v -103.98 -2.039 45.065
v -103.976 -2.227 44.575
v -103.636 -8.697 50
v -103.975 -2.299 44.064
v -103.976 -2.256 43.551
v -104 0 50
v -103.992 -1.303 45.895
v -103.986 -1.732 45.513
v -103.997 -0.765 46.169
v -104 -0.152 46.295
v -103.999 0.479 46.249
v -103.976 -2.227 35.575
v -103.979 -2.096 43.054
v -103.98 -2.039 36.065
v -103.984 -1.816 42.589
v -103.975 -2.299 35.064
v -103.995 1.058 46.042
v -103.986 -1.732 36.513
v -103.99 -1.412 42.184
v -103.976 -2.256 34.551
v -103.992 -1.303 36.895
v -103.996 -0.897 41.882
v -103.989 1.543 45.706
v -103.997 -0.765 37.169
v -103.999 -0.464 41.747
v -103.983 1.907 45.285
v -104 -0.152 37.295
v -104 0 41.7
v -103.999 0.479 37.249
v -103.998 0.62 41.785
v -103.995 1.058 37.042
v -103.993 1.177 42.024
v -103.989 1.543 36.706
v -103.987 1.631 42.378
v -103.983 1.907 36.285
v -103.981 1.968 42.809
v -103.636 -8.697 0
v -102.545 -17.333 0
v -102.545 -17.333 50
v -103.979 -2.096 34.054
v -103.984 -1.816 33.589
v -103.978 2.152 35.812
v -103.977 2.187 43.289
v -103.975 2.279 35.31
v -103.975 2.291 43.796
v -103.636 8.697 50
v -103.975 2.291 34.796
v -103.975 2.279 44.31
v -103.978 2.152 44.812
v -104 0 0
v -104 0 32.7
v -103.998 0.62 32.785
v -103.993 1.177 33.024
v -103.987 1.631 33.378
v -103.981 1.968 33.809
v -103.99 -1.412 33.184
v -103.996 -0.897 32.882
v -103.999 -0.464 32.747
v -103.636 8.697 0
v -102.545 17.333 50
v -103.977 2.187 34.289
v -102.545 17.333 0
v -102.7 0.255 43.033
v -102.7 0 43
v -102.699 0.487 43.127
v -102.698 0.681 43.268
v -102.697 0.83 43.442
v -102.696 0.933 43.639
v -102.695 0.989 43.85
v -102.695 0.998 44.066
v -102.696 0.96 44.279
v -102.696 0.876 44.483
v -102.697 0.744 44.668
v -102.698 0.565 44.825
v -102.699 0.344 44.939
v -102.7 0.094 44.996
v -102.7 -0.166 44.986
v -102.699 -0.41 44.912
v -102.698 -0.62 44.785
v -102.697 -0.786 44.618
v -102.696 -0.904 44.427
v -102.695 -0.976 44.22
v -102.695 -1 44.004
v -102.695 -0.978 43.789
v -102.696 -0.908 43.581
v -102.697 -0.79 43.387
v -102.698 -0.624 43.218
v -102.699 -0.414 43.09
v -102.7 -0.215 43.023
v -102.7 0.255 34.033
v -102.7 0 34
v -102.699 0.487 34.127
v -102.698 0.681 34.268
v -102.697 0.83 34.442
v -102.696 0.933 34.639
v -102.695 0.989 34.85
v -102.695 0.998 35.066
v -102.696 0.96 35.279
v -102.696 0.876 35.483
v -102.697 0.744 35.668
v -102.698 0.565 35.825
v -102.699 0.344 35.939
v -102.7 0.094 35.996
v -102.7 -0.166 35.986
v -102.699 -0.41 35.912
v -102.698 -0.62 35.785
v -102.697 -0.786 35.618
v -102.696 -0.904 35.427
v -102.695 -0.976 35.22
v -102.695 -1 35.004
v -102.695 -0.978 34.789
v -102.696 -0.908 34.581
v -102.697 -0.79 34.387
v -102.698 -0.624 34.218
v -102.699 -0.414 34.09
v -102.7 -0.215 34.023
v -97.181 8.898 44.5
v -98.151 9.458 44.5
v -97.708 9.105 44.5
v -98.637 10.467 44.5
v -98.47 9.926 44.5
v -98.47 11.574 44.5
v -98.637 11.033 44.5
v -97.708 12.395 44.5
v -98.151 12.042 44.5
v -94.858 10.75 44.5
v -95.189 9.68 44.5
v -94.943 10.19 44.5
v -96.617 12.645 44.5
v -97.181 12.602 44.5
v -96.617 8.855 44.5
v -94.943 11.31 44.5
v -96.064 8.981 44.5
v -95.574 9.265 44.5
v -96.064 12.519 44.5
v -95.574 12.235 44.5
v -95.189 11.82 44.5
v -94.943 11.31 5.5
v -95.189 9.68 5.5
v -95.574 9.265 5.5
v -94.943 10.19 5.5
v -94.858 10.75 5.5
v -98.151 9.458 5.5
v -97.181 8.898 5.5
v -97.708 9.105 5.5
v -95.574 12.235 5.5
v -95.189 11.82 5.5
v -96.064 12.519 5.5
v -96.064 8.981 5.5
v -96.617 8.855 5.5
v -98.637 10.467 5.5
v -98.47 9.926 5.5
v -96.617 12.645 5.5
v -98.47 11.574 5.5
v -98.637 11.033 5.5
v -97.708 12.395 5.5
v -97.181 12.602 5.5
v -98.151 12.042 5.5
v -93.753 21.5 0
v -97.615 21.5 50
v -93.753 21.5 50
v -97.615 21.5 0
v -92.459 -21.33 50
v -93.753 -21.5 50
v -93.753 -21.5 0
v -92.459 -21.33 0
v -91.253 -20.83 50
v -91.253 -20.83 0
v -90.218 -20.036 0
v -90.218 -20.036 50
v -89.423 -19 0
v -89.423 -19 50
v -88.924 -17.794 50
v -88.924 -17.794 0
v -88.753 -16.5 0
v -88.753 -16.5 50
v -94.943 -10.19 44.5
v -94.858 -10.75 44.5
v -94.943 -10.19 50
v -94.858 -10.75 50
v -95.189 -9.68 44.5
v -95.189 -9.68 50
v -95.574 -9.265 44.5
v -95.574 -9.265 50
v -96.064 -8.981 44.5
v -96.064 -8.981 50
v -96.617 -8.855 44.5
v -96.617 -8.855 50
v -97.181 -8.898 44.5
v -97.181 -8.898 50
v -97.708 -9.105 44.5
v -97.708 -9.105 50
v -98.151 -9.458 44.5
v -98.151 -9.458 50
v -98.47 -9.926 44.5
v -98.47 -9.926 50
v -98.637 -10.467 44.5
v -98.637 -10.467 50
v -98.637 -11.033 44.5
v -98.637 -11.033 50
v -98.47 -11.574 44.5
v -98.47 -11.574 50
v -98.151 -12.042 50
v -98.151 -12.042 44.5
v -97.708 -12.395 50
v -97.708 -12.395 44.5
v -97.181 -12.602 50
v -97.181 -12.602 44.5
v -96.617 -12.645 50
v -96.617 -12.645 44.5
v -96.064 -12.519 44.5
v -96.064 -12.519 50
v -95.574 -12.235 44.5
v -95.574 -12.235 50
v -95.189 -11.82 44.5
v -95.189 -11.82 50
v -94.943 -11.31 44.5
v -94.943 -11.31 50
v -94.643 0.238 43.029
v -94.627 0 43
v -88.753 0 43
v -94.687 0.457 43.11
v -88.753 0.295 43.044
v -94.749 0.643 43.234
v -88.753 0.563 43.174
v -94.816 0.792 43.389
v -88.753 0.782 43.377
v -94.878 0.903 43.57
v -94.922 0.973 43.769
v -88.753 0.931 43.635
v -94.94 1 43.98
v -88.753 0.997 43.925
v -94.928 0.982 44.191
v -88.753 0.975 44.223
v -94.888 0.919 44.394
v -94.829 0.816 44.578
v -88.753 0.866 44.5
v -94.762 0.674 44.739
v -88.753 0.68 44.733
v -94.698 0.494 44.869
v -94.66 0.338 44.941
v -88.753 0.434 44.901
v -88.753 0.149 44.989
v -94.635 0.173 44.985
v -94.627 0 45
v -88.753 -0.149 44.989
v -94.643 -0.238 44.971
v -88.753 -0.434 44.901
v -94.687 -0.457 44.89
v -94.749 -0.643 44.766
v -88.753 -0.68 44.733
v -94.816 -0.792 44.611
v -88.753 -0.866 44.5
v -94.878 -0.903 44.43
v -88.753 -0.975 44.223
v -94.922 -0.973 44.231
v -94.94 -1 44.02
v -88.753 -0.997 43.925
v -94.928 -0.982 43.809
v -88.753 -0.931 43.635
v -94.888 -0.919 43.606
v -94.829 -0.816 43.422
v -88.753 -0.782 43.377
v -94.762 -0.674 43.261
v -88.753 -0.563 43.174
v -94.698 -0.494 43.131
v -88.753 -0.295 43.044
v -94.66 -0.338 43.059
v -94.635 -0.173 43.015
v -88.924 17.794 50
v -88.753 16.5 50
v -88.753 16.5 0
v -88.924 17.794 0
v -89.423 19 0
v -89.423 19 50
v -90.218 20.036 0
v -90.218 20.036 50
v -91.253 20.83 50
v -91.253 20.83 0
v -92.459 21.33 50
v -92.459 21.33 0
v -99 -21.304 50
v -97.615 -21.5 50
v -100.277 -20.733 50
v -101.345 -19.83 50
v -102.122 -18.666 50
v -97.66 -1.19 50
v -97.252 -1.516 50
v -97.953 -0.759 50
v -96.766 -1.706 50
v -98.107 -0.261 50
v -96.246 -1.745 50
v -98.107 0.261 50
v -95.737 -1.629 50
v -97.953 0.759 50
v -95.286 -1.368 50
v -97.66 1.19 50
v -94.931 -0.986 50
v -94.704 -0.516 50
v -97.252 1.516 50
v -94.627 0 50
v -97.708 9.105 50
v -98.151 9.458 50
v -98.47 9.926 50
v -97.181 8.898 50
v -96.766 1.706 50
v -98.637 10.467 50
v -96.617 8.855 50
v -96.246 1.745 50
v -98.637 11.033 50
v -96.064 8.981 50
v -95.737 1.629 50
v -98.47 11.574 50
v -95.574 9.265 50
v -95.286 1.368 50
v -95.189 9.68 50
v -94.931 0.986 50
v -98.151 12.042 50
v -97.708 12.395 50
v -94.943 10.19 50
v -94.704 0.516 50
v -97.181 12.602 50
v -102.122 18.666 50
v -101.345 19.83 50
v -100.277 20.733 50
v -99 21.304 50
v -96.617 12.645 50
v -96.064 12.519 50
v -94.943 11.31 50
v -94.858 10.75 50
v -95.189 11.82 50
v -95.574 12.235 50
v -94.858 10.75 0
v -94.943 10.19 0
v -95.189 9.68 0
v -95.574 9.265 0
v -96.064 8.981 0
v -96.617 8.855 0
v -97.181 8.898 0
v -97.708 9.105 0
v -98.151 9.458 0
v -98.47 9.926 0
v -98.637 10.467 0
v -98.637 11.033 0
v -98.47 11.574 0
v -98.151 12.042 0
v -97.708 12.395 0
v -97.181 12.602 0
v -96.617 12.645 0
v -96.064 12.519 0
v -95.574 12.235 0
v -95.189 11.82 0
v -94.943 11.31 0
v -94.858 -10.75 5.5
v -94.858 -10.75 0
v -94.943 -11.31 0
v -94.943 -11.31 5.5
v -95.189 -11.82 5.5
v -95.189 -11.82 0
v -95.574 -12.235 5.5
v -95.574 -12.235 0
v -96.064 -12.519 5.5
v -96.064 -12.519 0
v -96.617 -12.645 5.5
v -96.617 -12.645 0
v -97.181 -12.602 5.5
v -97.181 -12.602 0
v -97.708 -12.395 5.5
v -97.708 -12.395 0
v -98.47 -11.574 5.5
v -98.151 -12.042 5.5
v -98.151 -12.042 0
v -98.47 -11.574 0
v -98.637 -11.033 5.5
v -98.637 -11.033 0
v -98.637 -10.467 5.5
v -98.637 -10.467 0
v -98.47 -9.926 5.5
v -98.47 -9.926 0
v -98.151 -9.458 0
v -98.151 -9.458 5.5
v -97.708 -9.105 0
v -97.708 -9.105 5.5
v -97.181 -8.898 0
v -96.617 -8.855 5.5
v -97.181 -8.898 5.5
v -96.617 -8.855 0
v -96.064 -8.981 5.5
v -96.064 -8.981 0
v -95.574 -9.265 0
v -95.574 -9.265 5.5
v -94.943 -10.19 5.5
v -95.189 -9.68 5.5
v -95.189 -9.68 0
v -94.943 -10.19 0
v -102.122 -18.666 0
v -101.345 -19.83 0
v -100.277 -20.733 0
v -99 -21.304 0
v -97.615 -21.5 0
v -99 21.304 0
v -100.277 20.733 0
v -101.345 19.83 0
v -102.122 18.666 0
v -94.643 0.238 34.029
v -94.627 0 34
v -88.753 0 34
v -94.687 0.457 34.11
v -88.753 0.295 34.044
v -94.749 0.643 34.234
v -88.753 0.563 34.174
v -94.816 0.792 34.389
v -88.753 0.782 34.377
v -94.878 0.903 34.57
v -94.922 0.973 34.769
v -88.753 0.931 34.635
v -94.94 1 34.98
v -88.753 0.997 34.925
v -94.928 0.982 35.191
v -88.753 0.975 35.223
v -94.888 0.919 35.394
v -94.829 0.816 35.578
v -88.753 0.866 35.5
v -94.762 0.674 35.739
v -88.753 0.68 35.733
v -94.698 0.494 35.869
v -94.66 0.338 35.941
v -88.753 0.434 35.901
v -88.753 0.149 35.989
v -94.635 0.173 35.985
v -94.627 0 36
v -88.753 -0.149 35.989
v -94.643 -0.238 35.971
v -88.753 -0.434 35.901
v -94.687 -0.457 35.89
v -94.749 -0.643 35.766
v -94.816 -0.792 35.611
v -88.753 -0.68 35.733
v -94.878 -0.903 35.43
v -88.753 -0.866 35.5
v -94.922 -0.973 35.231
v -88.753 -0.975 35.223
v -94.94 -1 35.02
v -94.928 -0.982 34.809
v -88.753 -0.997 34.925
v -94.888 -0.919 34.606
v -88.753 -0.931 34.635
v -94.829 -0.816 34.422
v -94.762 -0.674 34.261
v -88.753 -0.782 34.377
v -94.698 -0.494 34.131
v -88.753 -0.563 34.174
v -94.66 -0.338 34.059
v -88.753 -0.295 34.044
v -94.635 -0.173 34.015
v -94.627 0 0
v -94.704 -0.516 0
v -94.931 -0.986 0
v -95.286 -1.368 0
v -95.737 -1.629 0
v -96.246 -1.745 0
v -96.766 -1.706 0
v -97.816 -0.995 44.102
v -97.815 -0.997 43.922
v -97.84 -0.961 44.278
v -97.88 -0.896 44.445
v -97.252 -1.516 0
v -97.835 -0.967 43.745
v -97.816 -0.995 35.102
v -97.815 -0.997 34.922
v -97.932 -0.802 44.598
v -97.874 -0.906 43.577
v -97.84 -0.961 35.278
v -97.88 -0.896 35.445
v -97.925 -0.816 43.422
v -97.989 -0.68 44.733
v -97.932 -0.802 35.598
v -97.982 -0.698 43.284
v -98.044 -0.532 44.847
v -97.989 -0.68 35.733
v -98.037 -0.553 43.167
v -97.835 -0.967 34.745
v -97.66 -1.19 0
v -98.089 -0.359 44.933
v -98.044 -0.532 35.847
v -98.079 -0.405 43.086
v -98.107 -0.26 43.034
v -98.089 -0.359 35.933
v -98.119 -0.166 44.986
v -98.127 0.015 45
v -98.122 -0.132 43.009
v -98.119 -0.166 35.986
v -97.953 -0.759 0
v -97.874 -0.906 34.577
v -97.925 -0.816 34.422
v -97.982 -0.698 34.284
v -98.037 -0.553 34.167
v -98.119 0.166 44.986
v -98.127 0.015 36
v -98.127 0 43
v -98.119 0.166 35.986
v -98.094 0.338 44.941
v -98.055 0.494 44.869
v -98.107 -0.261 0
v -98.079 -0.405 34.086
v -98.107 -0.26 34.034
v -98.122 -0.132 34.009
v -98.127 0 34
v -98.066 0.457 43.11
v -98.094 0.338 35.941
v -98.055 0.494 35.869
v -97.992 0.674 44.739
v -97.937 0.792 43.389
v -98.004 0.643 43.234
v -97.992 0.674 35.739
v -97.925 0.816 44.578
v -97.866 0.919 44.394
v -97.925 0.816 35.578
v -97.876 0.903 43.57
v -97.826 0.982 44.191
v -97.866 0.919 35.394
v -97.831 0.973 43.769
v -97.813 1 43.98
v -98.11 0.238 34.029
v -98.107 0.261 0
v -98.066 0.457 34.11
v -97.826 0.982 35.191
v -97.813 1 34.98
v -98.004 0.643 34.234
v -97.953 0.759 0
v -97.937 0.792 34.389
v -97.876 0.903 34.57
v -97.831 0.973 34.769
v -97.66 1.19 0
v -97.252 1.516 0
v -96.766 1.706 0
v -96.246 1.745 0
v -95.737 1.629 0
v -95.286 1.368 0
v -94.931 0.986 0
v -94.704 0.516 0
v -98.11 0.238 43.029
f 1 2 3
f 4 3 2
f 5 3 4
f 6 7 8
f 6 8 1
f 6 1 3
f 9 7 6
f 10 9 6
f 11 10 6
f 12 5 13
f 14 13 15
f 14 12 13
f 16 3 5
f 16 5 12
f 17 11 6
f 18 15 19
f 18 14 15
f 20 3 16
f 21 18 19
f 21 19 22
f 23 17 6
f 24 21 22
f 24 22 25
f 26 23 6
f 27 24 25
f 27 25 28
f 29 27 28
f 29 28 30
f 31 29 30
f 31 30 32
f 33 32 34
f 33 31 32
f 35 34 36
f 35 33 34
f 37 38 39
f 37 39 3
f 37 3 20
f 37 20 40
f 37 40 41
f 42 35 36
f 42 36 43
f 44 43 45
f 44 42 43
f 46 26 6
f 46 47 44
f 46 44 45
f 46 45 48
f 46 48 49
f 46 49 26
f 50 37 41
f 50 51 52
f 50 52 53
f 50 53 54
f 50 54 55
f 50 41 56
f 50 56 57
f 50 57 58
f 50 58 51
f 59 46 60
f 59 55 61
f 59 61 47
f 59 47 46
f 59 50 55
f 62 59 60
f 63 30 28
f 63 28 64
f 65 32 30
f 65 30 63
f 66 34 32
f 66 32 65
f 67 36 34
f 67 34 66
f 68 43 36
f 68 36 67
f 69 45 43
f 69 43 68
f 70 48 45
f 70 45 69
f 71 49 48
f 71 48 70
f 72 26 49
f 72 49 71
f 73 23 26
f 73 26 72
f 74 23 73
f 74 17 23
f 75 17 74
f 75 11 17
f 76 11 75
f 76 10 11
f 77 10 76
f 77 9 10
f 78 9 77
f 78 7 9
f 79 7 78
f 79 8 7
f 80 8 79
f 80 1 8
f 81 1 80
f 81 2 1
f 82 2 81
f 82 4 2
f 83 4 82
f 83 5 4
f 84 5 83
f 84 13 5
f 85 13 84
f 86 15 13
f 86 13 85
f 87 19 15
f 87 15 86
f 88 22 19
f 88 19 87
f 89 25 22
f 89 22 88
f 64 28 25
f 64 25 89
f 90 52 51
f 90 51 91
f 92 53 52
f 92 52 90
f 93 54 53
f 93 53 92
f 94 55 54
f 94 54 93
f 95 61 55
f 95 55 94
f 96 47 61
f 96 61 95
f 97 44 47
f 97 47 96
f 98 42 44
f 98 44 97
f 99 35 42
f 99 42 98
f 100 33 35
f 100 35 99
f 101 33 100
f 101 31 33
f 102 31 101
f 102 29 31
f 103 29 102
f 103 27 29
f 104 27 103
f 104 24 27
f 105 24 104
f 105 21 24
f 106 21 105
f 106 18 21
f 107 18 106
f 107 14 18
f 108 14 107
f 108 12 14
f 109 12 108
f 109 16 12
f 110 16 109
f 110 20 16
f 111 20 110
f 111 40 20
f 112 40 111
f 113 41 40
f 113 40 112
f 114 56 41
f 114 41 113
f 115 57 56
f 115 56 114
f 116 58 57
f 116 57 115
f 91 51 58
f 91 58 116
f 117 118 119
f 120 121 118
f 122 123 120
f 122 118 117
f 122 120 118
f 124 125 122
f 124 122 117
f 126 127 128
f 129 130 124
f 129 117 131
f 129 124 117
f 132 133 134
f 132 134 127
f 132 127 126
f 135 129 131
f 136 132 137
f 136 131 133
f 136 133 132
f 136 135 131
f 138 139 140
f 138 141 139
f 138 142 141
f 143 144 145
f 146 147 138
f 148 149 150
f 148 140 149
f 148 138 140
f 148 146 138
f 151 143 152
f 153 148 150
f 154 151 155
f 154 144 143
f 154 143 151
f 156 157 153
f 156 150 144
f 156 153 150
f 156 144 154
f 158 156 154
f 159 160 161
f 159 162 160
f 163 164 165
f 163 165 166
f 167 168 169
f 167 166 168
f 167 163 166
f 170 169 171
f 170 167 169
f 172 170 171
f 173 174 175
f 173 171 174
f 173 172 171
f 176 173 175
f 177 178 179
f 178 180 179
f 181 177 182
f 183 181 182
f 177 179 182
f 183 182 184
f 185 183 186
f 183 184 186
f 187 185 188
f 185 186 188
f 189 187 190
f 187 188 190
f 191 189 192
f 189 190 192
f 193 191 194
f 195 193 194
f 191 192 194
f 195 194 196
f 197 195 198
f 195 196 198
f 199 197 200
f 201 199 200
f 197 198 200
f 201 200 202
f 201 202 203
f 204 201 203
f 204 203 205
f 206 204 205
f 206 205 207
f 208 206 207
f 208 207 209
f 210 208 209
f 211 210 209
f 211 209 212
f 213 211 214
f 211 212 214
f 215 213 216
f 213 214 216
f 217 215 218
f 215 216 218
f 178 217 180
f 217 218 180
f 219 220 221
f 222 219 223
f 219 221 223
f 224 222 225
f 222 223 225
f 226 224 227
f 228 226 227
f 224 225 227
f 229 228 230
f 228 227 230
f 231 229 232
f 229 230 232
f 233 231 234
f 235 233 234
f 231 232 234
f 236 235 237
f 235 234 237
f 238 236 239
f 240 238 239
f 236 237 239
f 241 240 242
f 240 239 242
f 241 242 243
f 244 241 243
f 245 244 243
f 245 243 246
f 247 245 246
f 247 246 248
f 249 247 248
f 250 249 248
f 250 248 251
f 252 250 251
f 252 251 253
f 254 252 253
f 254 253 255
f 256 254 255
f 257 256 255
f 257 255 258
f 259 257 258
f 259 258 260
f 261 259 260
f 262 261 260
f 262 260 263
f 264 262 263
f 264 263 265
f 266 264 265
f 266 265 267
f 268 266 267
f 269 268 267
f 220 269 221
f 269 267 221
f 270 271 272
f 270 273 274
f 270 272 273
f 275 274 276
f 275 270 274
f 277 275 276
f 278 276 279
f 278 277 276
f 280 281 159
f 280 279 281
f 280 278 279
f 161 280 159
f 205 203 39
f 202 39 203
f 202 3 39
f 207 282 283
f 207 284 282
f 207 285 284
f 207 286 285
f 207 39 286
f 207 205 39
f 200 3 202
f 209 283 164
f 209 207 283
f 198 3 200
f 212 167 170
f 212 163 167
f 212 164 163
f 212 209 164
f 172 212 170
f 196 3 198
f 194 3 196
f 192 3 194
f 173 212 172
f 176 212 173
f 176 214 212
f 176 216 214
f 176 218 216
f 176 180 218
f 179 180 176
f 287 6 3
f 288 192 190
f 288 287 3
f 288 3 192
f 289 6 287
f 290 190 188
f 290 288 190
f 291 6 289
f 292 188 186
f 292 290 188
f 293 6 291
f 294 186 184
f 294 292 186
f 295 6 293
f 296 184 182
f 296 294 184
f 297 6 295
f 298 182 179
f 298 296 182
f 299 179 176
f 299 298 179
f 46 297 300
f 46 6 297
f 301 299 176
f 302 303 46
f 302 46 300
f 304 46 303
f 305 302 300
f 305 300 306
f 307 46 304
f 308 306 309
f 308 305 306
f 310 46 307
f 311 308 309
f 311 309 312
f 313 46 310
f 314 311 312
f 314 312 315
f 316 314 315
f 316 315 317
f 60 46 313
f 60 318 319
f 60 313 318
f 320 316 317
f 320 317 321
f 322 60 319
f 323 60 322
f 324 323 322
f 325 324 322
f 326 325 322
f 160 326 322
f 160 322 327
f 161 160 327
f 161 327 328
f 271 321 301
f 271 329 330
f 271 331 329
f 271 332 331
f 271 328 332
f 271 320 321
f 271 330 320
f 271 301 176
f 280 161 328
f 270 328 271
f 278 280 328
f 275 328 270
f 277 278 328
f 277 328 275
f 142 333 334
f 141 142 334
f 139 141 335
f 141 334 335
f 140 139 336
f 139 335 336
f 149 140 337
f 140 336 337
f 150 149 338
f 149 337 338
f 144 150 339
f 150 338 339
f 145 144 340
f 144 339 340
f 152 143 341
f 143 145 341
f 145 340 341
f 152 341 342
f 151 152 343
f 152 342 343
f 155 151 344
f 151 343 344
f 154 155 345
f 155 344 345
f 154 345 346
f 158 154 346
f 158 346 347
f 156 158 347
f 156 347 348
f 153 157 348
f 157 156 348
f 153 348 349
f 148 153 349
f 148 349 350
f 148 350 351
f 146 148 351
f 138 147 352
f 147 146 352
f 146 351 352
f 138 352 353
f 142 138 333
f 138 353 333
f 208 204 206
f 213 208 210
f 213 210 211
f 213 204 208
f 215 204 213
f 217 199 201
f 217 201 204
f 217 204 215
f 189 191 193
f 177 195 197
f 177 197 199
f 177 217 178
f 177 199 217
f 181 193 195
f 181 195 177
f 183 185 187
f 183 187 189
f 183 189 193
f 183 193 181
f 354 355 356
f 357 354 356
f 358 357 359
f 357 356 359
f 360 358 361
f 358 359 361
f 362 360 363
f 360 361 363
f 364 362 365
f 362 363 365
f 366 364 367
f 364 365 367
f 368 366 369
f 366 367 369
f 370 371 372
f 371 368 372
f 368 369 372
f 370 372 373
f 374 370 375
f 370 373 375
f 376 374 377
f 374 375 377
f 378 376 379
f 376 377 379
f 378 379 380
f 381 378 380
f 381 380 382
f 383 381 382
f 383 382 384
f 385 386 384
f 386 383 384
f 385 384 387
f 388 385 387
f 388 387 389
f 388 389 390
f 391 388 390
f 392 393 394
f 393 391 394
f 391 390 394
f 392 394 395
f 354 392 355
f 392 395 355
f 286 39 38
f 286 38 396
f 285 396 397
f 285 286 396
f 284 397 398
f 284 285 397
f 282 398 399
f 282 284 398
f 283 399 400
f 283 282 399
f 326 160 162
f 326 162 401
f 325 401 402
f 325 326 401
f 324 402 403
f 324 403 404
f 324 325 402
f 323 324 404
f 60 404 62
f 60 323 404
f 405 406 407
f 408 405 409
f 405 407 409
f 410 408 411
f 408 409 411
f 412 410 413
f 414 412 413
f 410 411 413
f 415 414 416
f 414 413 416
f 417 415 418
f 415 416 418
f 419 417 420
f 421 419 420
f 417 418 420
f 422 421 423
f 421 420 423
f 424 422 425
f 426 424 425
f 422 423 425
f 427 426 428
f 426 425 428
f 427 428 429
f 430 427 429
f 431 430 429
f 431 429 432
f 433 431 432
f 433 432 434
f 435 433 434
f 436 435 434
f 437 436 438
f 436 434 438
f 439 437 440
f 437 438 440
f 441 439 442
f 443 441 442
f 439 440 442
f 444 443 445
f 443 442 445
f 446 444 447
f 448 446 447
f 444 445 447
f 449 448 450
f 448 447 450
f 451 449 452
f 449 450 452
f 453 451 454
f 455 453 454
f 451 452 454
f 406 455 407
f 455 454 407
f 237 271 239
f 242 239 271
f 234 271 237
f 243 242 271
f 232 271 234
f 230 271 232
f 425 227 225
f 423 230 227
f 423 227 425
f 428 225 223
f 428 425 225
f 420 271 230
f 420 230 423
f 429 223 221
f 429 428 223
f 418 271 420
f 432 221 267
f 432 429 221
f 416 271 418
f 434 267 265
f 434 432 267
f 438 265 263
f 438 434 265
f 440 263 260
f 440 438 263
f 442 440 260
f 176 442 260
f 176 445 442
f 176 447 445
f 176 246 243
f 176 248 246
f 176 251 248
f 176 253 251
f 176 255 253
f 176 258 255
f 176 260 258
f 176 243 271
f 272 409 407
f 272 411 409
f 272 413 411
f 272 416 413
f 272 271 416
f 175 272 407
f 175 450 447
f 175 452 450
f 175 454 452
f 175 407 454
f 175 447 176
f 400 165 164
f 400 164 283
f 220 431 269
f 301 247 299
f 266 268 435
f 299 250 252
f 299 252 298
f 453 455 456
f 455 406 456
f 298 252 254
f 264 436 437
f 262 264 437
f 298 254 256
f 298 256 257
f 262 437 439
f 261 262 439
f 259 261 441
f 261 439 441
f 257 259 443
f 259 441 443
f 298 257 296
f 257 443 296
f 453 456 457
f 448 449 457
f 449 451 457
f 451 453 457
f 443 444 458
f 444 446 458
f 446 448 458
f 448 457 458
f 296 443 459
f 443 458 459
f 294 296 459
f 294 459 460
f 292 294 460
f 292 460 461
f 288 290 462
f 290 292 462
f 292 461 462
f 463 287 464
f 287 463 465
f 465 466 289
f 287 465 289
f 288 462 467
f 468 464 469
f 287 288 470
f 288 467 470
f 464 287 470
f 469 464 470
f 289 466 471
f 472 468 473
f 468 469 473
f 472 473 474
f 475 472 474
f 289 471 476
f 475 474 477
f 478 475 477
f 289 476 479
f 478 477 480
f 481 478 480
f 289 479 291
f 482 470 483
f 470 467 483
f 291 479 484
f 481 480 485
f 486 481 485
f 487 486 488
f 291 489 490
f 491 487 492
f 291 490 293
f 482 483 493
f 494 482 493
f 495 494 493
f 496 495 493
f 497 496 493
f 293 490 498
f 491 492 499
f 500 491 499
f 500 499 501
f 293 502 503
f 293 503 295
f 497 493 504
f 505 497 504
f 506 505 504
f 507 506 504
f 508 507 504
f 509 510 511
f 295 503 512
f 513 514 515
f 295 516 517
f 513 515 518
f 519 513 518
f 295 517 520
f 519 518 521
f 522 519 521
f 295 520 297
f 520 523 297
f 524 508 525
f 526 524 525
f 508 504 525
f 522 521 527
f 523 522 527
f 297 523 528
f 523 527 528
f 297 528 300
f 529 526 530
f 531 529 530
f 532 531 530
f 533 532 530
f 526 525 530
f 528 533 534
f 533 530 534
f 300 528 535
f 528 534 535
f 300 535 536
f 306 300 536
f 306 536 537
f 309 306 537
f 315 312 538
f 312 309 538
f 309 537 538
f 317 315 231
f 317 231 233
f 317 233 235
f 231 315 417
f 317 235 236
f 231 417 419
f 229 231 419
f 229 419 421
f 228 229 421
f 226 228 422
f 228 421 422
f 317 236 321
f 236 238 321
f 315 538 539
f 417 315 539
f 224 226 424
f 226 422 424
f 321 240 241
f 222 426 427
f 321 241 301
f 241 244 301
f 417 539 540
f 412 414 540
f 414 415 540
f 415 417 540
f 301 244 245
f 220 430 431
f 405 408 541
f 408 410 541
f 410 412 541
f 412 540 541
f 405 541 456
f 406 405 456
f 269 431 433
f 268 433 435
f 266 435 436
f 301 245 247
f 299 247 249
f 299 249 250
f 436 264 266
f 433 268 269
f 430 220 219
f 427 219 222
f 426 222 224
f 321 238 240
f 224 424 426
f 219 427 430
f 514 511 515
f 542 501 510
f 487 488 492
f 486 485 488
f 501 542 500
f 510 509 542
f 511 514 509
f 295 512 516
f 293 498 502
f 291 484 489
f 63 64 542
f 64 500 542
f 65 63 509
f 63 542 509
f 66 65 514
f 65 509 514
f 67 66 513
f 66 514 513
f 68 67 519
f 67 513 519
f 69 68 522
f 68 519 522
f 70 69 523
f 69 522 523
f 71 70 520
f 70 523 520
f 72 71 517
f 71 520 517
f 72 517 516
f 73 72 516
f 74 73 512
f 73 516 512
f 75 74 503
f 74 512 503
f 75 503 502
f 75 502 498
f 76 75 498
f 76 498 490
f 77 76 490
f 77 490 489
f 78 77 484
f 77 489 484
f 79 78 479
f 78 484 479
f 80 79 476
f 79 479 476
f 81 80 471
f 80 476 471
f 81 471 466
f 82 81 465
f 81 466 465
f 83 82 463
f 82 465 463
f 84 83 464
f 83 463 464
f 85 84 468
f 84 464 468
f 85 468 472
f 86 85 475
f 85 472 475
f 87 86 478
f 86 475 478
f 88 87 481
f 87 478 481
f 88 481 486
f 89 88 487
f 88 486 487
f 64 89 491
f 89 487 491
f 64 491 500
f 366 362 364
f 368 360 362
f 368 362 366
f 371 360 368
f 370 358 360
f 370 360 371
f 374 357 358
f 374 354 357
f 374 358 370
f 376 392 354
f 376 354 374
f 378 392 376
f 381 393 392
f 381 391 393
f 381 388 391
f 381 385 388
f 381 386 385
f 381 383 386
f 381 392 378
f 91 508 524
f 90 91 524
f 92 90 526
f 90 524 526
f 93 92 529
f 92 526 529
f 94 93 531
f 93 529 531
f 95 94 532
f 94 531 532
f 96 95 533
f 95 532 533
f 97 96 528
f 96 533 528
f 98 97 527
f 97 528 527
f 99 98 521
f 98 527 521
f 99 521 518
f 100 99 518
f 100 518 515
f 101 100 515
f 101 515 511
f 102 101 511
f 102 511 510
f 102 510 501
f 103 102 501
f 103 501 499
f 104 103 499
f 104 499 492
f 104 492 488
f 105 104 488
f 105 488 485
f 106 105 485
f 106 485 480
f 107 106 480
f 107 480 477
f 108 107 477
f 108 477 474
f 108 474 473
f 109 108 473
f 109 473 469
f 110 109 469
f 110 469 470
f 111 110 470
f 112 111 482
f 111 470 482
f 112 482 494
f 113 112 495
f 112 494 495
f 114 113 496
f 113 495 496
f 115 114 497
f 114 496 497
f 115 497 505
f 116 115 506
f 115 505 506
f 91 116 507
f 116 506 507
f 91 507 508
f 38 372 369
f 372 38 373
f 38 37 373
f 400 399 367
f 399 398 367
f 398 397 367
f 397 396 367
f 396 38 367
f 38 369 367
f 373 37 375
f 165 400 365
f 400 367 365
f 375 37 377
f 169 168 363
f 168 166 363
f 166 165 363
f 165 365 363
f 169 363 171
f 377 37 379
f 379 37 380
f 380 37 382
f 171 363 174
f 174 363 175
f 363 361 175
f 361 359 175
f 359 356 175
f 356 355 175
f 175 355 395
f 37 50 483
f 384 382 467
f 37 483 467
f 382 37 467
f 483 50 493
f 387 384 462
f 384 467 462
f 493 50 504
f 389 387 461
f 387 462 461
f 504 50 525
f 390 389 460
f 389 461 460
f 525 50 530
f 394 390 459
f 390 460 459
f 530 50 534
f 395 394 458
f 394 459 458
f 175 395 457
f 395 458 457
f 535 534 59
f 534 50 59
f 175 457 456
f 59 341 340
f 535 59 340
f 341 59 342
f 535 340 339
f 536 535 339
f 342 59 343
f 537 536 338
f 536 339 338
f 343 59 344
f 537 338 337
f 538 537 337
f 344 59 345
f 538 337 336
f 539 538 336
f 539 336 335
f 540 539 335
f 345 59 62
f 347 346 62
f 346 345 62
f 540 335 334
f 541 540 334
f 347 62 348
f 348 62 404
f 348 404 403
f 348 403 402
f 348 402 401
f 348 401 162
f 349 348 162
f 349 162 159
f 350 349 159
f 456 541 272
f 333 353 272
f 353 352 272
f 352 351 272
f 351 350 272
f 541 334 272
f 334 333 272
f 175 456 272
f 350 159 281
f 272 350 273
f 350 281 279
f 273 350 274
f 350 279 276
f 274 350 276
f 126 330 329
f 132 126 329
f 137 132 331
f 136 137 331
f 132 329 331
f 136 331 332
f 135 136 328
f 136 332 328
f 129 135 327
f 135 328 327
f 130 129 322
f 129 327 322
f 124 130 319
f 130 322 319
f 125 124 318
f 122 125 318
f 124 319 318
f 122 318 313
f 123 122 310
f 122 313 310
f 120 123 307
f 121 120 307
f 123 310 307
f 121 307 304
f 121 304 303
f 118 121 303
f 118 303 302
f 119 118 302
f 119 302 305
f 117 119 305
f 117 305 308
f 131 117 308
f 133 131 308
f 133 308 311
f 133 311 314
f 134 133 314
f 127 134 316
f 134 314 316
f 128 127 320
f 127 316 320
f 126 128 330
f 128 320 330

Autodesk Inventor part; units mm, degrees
ref_plane "РабПлоскость1" through (0, 0, 0) normal (0, 0, 1) x (1, 0, 0)
sketch "Эскиз1" plane through (0, 0, 0) normal (0, 0, 1) x (1, 0, 0)
  arc A0 (37.3284, -97.07) -> (37.3284, 97.07) centre (0, 0) ccw projected
  line L0 (-145.6, 0) -> (145.6, 0) construction
  line L1 (-101.7534, 21.5) -> (-88.7534, 21.5)
  line L2 (-88.7534, 21.5) -> (-88.7534, -21.5)
  line L3 (-88.7534, -21.5) -> (-101.7534, -21.5)
  line L4 (-101.7534, -21.5) -> (-101.7534, 21.5) construction
  line L5 (104, 0) -> (-88.7534, 0) construction
  circle A1 centre (-96.3767, 0) radius 1.75
  arc A2 (-92.7471, 47.0529) -> (-92.7471, -47.0529) centre (0, 0) ccw
  point P0 (0, 0)
  point P1 (-101.7534, 0)
  point P2 (-101.7534, 21.5)
  dimension "d0" = 43
  dimension "d1" = 13
ref_plane "РабПлоскость2" through (-75.9237, -75.9237, 50) normal (0, 0, 1) x (0.7071, -0.7071, 0)
extrude "Выдавливание1" add sketch "Эскиз1" along normal up to surface (50 mm away)
fillet "Сопряжение1" radius 5 4 edges at (-88.7534, 21.5, 25) (-88.7534, -21.5, 25) (-101.7534, -21.5, 25) (-101.7534, 21.5, 25)
sketch "Эскиз2" plane through (-88.7534, -16.5, 0) normal (1, 0, 0) x (0, 0, -1)
  line L0 (-50, 18.25) -> (-50, 14.75) projected
  line L1 (0, 14.75) -> (0, 18.25) projected
  circle A0 centre (-44, 16.5) radius 1
  line L2 (-50, 14.75) -> (0, 14.75) projected
  circle A1 centre (-35, 16.5) radius 1
  line L3 (-50, 16.5) -> (0, 16.5) construction
  line L4 (-50, 33) -> (-50, 0) projected
  point P0 (0, 16.5)
  dimension "d6" = 2
  dimension "d9" = 6
  dimension "d10" = 15
extrude "Выдавливание2" cut sketch "Эскиз2" against normal through all
chamfer "Фаска1" distance 1.3 angle 45 2 edges at (-104, 0.0084, 45) (-104, 0.0084, 36)
sketch "Эскиз3" plane through (-97.6153, -21.5, 50) normal (0, 0, 1) x (1, 0, 0)
  line L0 (0.8568, 43) -> (0.8568, 0) construction
  circle A0 centre (0.8568, 21.5) radius 1.8 projected
  line L1 (0, 43) -> (3.8619, 43) construction
  line L2 (3.8619, 0) -> (0, 0) construction
  circle A1 centre (0.8568, 32.25) radius 1.9
  circle A2 centre (0.8568, 10.75) radius 1.9
  point P0 (97.6153, 21.5)
  point P1 (0.8568, 21.5)
  point P2 (-4.1381, 43)
  dimension "d16" = 21.5
  dimension "d17" = 10.75
  dimension "d18" = 10.75
  dimension "d19" = 3.8
extrude "Выдавливание3" cut sketch "Эскиз3" against normal blind 5.5 contours A1 | A2
ref_plane "РабПлоскость3" through (-97.6153, -21.5, 25) normal (0, 0, 1) x (1, 0, 0)
mirror "Зеркальное отражение1" about plane through (-97.6153, -21.5, 25) normal (0, 0, 1) of "Выдавливание3"
equation "\"d17\" = 0.5 * d16"
equation "\"d18\" = d17"
properties part number "крепление ручки"
